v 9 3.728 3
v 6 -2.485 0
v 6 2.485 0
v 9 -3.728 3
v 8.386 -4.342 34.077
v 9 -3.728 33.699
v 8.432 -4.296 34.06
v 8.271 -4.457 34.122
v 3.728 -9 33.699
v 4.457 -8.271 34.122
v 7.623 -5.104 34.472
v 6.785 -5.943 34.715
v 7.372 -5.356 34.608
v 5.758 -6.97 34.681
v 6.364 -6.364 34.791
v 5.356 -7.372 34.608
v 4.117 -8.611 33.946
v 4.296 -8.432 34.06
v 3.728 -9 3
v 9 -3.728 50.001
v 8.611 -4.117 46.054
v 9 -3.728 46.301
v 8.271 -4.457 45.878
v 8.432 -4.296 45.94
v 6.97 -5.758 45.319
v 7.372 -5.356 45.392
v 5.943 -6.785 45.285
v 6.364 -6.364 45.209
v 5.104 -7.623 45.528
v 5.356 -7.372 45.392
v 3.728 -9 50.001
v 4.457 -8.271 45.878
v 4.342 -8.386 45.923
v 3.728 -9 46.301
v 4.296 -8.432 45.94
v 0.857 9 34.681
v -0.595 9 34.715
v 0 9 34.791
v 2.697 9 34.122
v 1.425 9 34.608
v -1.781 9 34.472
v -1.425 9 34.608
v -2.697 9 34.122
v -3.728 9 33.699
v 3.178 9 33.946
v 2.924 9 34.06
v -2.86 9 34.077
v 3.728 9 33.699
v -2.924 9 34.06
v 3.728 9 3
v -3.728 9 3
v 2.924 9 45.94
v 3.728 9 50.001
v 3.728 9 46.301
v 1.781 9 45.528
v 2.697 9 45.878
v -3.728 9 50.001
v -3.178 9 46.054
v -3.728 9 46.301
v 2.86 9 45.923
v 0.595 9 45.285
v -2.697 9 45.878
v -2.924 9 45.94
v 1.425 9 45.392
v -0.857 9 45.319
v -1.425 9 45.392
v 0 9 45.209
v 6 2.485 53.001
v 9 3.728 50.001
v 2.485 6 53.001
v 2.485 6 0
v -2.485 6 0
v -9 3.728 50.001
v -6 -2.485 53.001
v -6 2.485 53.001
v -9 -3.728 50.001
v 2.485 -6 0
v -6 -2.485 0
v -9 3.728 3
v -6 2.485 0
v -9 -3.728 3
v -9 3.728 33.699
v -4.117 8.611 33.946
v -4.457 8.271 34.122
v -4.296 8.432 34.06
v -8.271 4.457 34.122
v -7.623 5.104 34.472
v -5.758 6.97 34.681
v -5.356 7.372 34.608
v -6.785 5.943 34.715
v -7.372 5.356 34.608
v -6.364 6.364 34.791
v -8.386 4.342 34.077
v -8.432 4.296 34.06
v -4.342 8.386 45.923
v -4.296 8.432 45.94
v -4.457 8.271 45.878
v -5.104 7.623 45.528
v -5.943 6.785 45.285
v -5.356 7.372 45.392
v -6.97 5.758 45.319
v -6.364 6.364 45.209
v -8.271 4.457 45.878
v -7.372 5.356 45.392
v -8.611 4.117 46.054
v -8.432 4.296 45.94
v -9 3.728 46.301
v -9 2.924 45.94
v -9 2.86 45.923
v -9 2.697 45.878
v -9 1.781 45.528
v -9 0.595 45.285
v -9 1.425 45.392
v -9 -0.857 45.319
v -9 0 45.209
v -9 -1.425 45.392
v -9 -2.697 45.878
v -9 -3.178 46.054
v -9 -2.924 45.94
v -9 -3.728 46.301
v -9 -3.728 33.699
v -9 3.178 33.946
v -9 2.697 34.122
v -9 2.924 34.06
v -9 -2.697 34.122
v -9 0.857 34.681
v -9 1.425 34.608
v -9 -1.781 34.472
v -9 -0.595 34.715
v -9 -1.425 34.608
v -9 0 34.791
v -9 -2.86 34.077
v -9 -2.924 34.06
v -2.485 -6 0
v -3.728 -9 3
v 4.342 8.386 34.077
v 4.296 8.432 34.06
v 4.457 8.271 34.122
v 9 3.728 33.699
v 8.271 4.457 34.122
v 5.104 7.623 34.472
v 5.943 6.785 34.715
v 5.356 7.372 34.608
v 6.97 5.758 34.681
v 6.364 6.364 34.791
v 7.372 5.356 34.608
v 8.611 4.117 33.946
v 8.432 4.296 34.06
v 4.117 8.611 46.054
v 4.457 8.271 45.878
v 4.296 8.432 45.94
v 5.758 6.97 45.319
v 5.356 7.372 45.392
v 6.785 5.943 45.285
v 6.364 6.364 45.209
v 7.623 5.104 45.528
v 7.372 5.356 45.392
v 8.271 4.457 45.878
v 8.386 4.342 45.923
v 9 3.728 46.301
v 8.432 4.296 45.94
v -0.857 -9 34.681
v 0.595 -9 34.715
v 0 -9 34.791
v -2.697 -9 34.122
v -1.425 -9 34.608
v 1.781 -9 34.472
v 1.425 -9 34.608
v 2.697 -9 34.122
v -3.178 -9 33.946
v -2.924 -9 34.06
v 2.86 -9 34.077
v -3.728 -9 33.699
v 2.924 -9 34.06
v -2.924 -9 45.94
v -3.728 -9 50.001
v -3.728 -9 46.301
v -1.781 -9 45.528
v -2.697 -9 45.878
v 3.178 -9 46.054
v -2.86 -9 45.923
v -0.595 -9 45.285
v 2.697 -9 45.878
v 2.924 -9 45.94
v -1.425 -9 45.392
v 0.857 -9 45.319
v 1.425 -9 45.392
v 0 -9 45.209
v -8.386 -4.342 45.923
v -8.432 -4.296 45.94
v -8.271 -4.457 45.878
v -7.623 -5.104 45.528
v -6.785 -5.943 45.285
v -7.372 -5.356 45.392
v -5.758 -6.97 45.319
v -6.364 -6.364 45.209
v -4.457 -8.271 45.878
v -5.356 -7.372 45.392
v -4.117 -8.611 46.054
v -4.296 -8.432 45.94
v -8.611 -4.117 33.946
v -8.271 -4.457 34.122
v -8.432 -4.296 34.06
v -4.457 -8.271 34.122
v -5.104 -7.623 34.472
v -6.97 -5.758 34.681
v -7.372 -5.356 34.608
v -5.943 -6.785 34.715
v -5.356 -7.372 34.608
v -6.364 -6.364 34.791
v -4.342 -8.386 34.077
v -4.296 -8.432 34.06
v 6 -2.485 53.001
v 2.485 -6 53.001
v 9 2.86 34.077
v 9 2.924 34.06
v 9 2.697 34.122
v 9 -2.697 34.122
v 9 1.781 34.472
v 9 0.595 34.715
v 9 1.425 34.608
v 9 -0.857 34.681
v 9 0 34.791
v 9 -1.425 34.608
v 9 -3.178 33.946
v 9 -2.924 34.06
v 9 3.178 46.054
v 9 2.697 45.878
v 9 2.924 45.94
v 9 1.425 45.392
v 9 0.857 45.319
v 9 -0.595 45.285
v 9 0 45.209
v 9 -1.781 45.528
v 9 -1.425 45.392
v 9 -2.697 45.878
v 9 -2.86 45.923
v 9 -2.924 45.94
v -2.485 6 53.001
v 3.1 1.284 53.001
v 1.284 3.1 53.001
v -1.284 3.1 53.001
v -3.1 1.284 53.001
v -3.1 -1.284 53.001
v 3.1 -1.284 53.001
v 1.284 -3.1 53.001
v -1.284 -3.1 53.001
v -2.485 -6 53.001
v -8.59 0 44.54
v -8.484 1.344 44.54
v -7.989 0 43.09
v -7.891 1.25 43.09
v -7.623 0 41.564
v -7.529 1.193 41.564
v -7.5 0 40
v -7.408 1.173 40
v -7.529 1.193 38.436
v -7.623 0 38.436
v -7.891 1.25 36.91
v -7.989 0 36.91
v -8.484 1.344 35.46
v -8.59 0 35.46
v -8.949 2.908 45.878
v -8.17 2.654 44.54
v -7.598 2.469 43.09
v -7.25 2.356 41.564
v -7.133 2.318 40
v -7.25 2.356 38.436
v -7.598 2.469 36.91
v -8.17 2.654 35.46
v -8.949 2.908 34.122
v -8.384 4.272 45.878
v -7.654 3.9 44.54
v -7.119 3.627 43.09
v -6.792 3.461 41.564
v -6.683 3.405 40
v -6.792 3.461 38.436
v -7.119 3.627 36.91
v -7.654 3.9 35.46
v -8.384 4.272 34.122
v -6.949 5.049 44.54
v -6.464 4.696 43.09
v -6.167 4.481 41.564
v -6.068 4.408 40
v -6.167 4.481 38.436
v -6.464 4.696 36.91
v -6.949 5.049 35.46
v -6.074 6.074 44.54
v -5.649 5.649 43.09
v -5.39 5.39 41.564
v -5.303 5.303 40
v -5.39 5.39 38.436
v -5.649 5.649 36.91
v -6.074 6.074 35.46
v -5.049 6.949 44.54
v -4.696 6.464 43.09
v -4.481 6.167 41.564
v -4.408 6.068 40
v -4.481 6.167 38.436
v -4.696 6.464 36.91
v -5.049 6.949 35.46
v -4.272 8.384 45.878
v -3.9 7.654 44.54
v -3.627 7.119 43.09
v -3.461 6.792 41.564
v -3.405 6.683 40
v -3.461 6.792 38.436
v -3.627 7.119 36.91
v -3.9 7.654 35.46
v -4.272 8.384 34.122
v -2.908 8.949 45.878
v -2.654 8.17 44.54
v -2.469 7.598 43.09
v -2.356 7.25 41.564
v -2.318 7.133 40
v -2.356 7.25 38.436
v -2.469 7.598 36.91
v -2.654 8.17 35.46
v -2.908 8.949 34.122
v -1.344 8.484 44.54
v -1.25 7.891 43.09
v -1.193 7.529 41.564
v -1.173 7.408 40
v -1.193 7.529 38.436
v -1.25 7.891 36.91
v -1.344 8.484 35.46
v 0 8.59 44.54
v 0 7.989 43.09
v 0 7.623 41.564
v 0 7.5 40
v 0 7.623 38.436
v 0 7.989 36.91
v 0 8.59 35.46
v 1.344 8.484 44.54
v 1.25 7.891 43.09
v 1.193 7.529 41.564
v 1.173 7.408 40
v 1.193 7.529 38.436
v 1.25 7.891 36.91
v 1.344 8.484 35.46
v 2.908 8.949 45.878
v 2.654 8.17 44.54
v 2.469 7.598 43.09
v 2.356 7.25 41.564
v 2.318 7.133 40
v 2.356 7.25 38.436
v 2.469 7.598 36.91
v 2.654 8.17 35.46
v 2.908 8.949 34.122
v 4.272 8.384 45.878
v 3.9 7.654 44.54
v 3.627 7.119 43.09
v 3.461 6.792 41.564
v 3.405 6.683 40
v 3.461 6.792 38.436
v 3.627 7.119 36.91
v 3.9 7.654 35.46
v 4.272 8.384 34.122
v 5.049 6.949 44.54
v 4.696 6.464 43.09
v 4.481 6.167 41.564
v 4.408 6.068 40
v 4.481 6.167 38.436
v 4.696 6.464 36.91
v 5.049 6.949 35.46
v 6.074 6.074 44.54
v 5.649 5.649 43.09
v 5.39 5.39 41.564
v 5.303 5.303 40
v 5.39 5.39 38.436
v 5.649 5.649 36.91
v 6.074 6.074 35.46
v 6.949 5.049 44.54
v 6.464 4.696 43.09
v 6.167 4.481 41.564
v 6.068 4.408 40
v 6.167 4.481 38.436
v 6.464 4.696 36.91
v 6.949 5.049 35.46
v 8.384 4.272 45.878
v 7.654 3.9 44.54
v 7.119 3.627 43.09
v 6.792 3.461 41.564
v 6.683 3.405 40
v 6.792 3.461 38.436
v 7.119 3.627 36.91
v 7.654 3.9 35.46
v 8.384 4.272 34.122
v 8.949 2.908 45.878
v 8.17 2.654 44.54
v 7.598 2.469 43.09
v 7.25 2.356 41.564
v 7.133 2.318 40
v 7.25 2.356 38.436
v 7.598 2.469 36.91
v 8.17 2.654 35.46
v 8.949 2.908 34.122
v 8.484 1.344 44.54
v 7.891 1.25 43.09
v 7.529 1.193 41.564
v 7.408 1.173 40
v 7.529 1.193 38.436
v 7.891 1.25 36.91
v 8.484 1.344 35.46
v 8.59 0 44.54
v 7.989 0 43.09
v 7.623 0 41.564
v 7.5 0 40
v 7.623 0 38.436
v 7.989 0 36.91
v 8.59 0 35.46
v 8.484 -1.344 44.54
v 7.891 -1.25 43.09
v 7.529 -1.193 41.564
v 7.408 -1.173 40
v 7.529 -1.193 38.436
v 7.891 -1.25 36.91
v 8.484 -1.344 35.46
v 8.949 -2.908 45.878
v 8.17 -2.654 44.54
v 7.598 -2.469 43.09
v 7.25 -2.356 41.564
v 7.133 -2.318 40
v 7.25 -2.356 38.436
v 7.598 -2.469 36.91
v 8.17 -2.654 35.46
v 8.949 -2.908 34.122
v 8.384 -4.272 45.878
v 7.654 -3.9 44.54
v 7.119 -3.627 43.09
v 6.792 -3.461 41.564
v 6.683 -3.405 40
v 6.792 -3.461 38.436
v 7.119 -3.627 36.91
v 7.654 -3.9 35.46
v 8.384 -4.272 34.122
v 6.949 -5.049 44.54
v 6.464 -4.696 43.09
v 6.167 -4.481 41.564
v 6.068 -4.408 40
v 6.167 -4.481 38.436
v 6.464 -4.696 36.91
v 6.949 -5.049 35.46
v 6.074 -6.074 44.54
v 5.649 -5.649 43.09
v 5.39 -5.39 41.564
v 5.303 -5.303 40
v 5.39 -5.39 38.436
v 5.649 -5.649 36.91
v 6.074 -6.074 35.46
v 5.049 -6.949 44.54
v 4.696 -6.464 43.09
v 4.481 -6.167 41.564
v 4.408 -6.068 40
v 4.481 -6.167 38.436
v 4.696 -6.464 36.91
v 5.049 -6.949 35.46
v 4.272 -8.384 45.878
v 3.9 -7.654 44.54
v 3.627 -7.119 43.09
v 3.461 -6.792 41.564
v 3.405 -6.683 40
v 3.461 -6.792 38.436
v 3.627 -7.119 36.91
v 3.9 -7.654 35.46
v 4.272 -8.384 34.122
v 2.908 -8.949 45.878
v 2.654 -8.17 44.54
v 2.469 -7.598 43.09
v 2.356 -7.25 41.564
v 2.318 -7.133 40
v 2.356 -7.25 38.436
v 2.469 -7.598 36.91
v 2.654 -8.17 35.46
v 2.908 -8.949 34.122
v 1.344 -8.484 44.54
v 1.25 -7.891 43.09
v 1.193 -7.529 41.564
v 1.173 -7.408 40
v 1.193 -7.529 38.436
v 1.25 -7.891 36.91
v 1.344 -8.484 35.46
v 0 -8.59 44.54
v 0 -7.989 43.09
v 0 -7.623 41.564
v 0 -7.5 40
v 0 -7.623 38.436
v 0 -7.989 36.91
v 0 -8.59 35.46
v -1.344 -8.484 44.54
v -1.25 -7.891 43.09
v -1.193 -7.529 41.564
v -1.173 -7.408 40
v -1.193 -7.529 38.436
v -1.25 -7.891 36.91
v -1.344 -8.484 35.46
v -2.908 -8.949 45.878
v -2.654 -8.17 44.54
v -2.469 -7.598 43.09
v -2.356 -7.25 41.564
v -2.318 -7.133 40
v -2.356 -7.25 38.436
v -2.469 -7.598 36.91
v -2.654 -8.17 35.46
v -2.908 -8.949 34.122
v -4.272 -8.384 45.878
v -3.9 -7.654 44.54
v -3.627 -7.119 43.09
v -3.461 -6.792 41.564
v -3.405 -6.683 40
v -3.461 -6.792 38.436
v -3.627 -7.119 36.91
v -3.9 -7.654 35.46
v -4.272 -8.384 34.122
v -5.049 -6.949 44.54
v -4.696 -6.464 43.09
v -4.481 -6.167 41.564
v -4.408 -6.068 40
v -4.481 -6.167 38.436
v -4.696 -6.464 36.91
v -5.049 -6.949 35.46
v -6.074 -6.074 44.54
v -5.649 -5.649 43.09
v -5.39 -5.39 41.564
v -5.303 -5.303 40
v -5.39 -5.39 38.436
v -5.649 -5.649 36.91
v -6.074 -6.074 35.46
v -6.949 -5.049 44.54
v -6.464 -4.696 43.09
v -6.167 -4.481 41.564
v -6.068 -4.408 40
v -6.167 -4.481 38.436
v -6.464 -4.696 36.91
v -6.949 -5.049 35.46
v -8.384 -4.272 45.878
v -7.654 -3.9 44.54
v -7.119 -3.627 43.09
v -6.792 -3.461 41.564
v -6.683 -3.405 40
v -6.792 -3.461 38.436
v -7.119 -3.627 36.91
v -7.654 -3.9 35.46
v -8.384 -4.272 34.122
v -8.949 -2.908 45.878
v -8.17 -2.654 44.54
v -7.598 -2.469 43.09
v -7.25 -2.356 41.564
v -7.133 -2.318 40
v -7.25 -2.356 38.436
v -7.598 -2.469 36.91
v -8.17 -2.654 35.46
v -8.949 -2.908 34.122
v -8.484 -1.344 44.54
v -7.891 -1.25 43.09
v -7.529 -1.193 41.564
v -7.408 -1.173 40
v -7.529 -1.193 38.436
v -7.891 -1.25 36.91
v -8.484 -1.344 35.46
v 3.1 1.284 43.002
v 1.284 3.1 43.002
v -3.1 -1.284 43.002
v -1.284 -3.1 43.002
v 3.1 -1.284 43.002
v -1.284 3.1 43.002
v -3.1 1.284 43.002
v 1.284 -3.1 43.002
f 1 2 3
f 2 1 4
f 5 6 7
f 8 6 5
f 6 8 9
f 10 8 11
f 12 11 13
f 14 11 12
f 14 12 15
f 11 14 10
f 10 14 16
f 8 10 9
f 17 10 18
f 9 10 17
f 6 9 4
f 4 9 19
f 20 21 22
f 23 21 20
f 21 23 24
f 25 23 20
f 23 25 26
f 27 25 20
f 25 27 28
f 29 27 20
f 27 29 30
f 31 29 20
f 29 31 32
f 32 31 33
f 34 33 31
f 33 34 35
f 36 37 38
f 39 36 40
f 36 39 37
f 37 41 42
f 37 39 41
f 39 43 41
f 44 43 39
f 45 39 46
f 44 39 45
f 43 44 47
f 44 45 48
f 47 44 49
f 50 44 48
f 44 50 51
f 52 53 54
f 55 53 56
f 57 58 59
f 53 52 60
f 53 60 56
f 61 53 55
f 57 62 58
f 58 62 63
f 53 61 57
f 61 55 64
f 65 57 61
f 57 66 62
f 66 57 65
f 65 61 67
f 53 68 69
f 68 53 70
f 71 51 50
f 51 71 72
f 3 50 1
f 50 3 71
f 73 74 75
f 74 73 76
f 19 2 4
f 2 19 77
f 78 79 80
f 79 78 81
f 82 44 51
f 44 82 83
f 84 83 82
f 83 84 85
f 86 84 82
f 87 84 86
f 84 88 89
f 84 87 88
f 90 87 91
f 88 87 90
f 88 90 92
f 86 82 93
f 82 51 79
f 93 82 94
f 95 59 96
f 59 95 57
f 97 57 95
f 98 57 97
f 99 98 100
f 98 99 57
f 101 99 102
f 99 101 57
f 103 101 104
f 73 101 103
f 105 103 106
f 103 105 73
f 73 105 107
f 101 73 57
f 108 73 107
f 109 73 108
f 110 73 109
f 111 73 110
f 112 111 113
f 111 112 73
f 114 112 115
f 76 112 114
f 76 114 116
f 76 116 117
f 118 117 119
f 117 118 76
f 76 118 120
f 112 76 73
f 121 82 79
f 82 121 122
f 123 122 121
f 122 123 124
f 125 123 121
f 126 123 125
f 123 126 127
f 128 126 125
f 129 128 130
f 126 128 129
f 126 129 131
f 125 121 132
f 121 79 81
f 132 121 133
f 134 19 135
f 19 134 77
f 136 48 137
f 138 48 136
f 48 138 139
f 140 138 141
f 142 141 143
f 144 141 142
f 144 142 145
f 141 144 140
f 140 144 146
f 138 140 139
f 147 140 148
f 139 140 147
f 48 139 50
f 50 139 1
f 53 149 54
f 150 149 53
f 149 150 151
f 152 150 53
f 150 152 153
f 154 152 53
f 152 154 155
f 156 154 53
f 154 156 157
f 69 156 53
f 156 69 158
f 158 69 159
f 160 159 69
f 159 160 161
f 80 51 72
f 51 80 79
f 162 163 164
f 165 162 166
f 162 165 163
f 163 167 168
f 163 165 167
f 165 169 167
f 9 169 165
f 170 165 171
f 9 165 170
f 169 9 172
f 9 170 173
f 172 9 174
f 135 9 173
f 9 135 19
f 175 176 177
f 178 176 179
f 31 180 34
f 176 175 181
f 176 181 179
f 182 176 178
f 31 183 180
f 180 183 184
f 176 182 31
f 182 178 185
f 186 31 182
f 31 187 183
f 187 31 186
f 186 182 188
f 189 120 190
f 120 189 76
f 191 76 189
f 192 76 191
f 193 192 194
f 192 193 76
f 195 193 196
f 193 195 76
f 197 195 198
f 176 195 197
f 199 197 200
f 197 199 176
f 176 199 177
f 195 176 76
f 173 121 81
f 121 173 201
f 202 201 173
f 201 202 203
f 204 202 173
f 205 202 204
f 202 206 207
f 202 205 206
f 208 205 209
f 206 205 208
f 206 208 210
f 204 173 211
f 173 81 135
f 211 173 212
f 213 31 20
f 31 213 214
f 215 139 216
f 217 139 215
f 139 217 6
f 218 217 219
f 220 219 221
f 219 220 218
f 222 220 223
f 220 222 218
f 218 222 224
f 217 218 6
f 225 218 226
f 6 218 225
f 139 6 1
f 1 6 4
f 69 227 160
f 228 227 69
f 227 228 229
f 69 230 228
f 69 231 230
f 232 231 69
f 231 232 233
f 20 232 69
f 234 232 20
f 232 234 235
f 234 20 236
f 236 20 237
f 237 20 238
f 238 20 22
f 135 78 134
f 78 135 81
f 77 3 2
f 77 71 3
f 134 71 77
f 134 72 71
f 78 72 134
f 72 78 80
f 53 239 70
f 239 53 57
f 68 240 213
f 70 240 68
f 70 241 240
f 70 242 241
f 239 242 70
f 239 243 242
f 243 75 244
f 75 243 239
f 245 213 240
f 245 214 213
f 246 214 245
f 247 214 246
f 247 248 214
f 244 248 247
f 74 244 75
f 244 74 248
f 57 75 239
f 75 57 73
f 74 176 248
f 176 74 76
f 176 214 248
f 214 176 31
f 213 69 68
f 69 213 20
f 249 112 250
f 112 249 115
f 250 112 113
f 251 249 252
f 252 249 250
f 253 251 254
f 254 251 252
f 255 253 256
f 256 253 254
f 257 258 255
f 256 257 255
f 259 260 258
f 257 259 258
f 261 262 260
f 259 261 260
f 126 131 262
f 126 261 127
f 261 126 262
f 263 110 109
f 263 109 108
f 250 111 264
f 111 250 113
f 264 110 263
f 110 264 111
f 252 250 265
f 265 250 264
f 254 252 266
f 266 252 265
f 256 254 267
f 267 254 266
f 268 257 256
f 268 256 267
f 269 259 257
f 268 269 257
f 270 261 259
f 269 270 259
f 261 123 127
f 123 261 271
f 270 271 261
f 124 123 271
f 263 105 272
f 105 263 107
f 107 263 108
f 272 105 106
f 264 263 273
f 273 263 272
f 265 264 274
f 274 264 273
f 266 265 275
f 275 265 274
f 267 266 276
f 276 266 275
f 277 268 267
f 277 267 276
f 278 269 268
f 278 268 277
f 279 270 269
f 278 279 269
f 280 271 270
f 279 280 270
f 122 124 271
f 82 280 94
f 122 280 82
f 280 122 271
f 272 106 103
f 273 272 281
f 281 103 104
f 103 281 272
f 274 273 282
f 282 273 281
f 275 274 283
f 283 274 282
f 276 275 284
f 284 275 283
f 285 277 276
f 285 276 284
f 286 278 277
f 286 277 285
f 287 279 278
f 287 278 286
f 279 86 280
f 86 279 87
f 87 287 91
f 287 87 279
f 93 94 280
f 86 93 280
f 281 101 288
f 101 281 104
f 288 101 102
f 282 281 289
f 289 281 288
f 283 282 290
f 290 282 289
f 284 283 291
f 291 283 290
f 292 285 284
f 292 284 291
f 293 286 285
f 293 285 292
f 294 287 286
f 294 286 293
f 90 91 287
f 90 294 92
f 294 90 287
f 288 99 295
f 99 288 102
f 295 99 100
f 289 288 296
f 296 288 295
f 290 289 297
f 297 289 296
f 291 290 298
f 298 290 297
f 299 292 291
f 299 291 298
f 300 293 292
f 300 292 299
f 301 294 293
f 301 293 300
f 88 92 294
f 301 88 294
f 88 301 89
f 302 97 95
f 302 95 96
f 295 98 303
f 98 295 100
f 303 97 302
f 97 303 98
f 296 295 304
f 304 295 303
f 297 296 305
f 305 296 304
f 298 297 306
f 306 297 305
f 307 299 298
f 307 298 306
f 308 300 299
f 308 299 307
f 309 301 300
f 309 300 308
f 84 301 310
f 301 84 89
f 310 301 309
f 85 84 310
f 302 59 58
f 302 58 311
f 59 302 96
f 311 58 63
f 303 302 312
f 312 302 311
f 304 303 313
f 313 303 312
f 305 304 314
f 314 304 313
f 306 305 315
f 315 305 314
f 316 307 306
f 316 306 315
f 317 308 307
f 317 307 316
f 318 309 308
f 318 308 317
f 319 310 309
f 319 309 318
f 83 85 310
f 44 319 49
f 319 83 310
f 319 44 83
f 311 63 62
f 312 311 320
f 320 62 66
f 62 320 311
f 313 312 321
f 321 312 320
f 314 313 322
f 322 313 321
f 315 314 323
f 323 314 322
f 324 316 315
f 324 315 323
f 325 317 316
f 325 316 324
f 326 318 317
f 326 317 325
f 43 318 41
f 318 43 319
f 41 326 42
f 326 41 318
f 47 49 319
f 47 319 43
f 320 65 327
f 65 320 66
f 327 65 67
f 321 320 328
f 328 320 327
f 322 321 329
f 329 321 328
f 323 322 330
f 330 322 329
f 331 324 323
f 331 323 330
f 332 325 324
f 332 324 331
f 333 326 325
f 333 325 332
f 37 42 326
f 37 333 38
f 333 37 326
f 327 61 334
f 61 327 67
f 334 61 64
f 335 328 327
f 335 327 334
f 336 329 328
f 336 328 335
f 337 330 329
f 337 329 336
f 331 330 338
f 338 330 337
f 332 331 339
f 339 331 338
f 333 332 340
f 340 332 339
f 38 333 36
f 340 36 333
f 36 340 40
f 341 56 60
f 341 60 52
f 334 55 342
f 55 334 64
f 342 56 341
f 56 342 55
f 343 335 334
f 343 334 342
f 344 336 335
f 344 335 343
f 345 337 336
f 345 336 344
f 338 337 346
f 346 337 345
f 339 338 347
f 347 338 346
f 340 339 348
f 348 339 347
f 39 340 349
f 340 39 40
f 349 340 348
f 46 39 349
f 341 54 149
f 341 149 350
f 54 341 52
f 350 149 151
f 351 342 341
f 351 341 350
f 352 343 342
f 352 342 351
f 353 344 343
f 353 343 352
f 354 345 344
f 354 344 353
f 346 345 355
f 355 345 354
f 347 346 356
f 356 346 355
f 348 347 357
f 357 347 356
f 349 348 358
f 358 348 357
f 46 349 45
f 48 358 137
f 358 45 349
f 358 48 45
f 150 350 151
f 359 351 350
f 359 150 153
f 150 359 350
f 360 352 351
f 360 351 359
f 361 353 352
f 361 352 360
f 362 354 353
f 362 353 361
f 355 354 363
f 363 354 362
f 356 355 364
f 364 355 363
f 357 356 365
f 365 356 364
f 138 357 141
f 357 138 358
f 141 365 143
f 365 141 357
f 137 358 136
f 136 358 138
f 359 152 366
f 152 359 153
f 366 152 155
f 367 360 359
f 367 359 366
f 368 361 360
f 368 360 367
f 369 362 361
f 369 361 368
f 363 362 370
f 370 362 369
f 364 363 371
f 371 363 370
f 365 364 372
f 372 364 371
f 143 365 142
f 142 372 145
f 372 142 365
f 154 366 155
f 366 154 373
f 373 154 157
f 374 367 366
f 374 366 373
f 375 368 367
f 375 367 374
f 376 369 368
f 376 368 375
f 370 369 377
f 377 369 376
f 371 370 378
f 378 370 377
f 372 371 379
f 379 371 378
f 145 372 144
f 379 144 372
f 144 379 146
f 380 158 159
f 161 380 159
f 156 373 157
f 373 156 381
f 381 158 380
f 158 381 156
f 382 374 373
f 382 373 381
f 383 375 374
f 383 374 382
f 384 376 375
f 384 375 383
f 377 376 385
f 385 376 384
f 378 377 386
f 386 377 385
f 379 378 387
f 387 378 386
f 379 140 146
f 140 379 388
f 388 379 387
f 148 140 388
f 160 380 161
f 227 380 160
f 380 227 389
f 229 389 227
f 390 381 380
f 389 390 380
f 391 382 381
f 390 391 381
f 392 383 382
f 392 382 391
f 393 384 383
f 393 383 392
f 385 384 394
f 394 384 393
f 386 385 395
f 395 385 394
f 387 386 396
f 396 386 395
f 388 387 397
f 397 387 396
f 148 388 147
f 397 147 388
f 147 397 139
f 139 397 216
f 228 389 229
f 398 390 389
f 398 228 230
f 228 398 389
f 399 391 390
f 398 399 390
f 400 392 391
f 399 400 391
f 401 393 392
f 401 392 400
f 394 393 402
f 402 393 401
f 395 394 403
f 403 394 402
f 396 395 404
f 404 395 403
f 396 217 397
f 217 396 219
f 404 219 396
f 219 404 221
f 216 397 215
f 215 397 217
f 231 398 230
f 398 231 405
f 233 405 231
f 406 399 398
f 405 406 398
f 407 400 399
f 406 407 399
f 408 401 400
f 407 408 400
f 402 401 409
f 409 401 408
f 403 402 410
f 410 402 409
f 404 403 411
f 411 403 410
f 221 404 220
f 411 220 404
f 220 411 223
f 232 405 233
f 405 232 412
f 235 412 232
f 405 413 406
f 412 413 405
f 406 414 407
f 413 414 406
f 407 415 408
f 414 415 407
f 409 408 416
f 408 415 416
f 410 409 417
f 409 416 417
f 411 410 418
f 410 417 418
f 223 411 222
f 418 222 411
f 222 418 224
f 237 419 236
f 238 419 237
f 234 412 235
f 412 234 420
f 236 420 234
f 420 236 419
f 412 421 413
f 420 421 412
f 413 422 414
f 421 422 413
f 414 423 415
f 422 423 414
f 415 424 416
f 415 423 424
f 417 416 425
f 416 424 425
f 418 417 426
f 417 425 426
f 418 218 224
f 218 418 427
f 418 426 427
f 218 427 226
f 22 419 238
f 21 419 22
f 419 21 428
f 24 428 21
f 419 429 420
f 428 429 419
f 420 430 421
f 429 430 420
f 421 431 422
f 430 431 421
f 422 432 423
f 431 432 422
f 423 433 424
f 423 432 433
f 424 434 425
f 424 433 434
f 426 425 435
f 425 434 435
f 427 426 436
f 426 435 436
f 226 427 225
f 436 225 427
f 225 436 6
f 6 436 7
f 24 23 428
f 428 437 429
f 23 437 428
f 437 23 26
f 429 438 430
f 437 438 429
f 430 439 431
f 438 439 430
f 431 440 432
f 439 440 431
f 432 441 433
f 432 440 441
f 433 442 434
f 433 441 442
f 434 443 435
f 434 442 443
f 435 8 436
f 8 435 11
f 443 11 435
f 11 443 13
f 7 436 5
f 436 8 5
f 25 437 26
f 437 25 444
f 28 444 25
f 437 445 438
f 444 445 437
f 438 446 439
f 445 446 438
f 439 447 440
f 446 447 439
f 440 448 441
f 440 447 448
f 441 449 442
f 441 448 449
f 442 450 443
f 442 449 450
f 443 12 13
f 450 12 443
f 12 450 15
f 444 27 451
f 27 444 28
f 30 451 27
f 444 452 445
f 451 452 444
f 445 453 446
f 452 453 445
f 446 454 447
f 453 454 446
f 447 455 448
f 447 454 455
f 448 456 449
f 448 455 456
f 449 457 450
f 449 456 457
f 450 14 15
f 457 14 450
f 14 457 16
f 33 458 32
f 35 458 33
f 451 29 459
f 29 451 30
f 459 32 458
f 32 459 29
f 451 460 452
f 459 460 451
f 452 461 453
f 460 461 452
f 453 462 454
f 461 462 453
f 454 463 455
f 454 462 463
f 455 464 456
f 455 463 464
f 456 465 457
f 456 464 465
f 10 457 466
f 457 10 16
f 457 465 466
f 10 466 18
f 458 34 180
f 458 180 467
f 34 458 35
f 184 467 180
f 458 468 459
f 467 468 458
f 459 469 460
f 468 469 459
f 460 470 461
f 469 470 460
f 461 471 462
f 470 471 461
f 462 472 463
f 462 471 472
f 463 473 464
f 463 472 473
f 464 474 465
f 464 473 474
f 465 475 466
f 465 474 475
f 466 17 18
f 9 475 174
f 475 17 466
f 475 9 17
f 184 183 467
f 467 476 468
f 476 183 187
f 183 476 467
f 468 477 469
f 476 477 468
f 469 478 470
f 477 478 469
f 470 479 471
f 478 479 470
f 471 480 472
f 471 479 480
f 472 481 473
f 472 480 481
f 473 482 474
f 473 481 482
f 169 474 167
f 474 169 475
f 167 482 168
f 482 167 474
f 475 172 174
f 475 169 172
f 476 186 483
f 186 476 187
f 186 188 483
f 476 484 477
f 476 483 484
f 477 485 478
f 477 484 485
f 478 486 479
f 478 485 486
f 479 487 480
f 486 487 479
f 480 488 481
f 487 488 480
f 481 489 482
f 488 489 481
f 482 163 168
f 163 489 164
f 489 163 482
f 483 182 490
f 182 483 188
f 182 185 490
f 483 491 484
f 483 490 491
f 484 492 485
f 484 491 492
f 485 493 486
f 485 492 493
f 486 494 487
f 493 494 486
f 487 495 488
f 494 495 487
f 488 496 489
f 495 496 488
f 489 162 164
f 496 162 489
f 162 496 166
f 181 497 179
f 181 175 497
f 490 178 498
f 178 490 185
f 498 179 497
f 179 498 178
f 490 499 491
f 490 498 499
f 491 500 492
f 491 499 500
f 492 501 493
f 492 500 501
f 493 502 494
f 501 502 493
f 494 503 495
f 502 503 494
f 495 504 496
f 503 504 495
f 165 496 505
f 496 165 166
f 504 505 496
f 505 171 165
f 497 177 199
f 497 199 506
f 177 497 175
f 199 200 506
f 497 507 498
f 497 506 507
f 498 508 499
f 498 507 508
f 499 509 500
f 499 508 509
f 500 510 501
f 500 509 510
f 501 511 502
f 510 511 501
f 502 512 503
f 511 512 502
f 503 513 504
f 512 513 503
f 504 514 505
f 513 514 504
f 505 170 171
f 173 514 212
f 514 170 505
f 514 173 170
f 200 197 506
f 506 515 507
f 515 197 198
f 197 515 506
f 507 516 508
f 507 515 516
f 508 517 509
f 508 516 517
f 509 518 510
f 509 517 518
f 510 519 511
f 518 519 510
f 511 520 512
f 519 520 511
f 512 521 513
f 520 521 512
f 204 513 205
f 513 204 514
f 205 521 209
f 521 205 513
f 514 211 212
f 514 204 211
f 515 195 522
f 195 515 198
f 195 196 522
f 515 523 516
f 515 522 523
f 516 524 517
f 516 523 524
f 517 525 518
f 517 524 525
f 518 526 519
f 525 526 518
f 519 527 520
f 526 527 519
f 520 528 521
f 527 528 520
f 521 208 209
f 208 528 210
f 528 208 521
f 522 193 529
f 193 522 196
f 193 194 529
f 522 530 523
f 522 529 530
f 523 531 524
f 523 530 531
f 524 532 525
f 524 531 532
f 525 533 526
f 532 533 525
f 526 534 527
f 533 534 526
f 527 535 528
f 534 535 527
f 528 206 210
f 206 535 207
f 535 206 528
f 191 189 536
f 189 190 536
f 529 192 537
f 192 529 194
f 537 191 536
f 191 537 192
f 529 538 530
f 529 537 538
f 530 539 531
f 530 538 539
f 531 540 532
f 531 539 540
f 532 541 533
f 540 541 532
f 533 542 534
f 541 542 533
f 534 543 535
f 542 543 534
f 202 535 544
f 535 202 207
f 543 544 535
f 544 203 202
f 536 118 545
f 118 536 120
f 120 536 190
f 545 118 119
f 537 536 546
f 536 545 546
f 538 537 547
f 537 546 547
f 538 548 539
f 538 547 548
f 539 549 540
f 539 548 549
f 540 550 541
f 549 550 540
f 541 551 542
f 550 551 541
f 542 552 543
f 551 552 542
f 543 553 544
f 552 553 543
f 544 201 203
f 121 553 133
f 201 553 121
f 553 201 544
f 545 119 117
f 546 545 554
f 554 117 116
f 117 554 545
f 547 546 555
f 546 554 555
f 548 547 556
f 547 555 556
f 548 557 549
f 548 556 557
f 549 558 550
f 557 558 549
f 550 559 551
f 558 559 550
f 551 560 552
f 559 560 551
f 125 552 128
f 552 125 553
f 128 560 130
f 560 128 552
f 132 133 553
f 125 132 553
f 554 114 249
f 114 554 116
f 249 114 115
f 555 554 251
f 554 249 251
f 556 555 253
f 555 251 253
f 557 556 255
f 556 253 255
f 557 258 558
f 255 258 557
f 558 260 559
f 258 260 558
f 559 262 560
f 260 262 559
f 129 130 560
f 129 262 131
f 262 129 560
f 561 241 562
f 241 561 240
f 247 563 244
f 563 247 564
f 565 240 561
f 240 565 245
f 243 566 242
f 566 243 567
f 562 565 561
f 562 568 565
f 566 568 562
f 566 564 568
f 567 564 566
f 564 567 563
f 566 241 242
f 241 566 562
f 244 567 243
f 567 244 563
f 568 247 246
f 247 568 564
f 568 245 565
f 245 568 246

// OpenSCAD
eps = 0.001;

rod_diameter = 6;
rod_length = 70;
tip_thickness = 0.8;

module octagon(diameter) {
  intersection()
  {
    square(diameter, center=true);

    rotate([0, 0, 45])
    square(diameter, center=true);
  }
}

module rod() {
  difference()
  {
    rotate([0, 90, 0])
    linear_extrude(rod_length)
    octagon(rod_diameter);

    for (a = [-1, 1])
    scale([1, a, 1])
    rotate([0, 0, 10])
    translate([0, tip_thickness/2, -10])
    cube(20);
  
    rotate([90, 0, 0])
    for (a = [-1, 1])
    scale([1, a, 1])
    rotate([0, 0, 45])
    translate([0, rod_diameter*0.28, -10])
    cube(20);
  }
}

handle_diameter = 18;

module handle() {
  $fn = 40;
  
  difference()
  {  
    hull()
    {
      linear_extrude(eps)
      octagon(handle_diameter-6);
   
      translate([0, 0, 3])
      linear_extrude(eps)
      octagon(handle_diameter);
   
      translate([0, 0, 50])
      linear_extrude(eps)
      octagon(handle_diameter);
   
      translate([0, 0, 53])
      linear_extrude(eps)
      octagon(handle_diameter-6);
    }
  
    translate([0, 0, 40])
    rotate_extrude()
    translate([17.5, 0])
    circle(10);
    
    translate([0, 0, 43+2*eps])
    linear_extrude(10)
    octagon(rod_diameter + 0.2);
  }
}

handle();
